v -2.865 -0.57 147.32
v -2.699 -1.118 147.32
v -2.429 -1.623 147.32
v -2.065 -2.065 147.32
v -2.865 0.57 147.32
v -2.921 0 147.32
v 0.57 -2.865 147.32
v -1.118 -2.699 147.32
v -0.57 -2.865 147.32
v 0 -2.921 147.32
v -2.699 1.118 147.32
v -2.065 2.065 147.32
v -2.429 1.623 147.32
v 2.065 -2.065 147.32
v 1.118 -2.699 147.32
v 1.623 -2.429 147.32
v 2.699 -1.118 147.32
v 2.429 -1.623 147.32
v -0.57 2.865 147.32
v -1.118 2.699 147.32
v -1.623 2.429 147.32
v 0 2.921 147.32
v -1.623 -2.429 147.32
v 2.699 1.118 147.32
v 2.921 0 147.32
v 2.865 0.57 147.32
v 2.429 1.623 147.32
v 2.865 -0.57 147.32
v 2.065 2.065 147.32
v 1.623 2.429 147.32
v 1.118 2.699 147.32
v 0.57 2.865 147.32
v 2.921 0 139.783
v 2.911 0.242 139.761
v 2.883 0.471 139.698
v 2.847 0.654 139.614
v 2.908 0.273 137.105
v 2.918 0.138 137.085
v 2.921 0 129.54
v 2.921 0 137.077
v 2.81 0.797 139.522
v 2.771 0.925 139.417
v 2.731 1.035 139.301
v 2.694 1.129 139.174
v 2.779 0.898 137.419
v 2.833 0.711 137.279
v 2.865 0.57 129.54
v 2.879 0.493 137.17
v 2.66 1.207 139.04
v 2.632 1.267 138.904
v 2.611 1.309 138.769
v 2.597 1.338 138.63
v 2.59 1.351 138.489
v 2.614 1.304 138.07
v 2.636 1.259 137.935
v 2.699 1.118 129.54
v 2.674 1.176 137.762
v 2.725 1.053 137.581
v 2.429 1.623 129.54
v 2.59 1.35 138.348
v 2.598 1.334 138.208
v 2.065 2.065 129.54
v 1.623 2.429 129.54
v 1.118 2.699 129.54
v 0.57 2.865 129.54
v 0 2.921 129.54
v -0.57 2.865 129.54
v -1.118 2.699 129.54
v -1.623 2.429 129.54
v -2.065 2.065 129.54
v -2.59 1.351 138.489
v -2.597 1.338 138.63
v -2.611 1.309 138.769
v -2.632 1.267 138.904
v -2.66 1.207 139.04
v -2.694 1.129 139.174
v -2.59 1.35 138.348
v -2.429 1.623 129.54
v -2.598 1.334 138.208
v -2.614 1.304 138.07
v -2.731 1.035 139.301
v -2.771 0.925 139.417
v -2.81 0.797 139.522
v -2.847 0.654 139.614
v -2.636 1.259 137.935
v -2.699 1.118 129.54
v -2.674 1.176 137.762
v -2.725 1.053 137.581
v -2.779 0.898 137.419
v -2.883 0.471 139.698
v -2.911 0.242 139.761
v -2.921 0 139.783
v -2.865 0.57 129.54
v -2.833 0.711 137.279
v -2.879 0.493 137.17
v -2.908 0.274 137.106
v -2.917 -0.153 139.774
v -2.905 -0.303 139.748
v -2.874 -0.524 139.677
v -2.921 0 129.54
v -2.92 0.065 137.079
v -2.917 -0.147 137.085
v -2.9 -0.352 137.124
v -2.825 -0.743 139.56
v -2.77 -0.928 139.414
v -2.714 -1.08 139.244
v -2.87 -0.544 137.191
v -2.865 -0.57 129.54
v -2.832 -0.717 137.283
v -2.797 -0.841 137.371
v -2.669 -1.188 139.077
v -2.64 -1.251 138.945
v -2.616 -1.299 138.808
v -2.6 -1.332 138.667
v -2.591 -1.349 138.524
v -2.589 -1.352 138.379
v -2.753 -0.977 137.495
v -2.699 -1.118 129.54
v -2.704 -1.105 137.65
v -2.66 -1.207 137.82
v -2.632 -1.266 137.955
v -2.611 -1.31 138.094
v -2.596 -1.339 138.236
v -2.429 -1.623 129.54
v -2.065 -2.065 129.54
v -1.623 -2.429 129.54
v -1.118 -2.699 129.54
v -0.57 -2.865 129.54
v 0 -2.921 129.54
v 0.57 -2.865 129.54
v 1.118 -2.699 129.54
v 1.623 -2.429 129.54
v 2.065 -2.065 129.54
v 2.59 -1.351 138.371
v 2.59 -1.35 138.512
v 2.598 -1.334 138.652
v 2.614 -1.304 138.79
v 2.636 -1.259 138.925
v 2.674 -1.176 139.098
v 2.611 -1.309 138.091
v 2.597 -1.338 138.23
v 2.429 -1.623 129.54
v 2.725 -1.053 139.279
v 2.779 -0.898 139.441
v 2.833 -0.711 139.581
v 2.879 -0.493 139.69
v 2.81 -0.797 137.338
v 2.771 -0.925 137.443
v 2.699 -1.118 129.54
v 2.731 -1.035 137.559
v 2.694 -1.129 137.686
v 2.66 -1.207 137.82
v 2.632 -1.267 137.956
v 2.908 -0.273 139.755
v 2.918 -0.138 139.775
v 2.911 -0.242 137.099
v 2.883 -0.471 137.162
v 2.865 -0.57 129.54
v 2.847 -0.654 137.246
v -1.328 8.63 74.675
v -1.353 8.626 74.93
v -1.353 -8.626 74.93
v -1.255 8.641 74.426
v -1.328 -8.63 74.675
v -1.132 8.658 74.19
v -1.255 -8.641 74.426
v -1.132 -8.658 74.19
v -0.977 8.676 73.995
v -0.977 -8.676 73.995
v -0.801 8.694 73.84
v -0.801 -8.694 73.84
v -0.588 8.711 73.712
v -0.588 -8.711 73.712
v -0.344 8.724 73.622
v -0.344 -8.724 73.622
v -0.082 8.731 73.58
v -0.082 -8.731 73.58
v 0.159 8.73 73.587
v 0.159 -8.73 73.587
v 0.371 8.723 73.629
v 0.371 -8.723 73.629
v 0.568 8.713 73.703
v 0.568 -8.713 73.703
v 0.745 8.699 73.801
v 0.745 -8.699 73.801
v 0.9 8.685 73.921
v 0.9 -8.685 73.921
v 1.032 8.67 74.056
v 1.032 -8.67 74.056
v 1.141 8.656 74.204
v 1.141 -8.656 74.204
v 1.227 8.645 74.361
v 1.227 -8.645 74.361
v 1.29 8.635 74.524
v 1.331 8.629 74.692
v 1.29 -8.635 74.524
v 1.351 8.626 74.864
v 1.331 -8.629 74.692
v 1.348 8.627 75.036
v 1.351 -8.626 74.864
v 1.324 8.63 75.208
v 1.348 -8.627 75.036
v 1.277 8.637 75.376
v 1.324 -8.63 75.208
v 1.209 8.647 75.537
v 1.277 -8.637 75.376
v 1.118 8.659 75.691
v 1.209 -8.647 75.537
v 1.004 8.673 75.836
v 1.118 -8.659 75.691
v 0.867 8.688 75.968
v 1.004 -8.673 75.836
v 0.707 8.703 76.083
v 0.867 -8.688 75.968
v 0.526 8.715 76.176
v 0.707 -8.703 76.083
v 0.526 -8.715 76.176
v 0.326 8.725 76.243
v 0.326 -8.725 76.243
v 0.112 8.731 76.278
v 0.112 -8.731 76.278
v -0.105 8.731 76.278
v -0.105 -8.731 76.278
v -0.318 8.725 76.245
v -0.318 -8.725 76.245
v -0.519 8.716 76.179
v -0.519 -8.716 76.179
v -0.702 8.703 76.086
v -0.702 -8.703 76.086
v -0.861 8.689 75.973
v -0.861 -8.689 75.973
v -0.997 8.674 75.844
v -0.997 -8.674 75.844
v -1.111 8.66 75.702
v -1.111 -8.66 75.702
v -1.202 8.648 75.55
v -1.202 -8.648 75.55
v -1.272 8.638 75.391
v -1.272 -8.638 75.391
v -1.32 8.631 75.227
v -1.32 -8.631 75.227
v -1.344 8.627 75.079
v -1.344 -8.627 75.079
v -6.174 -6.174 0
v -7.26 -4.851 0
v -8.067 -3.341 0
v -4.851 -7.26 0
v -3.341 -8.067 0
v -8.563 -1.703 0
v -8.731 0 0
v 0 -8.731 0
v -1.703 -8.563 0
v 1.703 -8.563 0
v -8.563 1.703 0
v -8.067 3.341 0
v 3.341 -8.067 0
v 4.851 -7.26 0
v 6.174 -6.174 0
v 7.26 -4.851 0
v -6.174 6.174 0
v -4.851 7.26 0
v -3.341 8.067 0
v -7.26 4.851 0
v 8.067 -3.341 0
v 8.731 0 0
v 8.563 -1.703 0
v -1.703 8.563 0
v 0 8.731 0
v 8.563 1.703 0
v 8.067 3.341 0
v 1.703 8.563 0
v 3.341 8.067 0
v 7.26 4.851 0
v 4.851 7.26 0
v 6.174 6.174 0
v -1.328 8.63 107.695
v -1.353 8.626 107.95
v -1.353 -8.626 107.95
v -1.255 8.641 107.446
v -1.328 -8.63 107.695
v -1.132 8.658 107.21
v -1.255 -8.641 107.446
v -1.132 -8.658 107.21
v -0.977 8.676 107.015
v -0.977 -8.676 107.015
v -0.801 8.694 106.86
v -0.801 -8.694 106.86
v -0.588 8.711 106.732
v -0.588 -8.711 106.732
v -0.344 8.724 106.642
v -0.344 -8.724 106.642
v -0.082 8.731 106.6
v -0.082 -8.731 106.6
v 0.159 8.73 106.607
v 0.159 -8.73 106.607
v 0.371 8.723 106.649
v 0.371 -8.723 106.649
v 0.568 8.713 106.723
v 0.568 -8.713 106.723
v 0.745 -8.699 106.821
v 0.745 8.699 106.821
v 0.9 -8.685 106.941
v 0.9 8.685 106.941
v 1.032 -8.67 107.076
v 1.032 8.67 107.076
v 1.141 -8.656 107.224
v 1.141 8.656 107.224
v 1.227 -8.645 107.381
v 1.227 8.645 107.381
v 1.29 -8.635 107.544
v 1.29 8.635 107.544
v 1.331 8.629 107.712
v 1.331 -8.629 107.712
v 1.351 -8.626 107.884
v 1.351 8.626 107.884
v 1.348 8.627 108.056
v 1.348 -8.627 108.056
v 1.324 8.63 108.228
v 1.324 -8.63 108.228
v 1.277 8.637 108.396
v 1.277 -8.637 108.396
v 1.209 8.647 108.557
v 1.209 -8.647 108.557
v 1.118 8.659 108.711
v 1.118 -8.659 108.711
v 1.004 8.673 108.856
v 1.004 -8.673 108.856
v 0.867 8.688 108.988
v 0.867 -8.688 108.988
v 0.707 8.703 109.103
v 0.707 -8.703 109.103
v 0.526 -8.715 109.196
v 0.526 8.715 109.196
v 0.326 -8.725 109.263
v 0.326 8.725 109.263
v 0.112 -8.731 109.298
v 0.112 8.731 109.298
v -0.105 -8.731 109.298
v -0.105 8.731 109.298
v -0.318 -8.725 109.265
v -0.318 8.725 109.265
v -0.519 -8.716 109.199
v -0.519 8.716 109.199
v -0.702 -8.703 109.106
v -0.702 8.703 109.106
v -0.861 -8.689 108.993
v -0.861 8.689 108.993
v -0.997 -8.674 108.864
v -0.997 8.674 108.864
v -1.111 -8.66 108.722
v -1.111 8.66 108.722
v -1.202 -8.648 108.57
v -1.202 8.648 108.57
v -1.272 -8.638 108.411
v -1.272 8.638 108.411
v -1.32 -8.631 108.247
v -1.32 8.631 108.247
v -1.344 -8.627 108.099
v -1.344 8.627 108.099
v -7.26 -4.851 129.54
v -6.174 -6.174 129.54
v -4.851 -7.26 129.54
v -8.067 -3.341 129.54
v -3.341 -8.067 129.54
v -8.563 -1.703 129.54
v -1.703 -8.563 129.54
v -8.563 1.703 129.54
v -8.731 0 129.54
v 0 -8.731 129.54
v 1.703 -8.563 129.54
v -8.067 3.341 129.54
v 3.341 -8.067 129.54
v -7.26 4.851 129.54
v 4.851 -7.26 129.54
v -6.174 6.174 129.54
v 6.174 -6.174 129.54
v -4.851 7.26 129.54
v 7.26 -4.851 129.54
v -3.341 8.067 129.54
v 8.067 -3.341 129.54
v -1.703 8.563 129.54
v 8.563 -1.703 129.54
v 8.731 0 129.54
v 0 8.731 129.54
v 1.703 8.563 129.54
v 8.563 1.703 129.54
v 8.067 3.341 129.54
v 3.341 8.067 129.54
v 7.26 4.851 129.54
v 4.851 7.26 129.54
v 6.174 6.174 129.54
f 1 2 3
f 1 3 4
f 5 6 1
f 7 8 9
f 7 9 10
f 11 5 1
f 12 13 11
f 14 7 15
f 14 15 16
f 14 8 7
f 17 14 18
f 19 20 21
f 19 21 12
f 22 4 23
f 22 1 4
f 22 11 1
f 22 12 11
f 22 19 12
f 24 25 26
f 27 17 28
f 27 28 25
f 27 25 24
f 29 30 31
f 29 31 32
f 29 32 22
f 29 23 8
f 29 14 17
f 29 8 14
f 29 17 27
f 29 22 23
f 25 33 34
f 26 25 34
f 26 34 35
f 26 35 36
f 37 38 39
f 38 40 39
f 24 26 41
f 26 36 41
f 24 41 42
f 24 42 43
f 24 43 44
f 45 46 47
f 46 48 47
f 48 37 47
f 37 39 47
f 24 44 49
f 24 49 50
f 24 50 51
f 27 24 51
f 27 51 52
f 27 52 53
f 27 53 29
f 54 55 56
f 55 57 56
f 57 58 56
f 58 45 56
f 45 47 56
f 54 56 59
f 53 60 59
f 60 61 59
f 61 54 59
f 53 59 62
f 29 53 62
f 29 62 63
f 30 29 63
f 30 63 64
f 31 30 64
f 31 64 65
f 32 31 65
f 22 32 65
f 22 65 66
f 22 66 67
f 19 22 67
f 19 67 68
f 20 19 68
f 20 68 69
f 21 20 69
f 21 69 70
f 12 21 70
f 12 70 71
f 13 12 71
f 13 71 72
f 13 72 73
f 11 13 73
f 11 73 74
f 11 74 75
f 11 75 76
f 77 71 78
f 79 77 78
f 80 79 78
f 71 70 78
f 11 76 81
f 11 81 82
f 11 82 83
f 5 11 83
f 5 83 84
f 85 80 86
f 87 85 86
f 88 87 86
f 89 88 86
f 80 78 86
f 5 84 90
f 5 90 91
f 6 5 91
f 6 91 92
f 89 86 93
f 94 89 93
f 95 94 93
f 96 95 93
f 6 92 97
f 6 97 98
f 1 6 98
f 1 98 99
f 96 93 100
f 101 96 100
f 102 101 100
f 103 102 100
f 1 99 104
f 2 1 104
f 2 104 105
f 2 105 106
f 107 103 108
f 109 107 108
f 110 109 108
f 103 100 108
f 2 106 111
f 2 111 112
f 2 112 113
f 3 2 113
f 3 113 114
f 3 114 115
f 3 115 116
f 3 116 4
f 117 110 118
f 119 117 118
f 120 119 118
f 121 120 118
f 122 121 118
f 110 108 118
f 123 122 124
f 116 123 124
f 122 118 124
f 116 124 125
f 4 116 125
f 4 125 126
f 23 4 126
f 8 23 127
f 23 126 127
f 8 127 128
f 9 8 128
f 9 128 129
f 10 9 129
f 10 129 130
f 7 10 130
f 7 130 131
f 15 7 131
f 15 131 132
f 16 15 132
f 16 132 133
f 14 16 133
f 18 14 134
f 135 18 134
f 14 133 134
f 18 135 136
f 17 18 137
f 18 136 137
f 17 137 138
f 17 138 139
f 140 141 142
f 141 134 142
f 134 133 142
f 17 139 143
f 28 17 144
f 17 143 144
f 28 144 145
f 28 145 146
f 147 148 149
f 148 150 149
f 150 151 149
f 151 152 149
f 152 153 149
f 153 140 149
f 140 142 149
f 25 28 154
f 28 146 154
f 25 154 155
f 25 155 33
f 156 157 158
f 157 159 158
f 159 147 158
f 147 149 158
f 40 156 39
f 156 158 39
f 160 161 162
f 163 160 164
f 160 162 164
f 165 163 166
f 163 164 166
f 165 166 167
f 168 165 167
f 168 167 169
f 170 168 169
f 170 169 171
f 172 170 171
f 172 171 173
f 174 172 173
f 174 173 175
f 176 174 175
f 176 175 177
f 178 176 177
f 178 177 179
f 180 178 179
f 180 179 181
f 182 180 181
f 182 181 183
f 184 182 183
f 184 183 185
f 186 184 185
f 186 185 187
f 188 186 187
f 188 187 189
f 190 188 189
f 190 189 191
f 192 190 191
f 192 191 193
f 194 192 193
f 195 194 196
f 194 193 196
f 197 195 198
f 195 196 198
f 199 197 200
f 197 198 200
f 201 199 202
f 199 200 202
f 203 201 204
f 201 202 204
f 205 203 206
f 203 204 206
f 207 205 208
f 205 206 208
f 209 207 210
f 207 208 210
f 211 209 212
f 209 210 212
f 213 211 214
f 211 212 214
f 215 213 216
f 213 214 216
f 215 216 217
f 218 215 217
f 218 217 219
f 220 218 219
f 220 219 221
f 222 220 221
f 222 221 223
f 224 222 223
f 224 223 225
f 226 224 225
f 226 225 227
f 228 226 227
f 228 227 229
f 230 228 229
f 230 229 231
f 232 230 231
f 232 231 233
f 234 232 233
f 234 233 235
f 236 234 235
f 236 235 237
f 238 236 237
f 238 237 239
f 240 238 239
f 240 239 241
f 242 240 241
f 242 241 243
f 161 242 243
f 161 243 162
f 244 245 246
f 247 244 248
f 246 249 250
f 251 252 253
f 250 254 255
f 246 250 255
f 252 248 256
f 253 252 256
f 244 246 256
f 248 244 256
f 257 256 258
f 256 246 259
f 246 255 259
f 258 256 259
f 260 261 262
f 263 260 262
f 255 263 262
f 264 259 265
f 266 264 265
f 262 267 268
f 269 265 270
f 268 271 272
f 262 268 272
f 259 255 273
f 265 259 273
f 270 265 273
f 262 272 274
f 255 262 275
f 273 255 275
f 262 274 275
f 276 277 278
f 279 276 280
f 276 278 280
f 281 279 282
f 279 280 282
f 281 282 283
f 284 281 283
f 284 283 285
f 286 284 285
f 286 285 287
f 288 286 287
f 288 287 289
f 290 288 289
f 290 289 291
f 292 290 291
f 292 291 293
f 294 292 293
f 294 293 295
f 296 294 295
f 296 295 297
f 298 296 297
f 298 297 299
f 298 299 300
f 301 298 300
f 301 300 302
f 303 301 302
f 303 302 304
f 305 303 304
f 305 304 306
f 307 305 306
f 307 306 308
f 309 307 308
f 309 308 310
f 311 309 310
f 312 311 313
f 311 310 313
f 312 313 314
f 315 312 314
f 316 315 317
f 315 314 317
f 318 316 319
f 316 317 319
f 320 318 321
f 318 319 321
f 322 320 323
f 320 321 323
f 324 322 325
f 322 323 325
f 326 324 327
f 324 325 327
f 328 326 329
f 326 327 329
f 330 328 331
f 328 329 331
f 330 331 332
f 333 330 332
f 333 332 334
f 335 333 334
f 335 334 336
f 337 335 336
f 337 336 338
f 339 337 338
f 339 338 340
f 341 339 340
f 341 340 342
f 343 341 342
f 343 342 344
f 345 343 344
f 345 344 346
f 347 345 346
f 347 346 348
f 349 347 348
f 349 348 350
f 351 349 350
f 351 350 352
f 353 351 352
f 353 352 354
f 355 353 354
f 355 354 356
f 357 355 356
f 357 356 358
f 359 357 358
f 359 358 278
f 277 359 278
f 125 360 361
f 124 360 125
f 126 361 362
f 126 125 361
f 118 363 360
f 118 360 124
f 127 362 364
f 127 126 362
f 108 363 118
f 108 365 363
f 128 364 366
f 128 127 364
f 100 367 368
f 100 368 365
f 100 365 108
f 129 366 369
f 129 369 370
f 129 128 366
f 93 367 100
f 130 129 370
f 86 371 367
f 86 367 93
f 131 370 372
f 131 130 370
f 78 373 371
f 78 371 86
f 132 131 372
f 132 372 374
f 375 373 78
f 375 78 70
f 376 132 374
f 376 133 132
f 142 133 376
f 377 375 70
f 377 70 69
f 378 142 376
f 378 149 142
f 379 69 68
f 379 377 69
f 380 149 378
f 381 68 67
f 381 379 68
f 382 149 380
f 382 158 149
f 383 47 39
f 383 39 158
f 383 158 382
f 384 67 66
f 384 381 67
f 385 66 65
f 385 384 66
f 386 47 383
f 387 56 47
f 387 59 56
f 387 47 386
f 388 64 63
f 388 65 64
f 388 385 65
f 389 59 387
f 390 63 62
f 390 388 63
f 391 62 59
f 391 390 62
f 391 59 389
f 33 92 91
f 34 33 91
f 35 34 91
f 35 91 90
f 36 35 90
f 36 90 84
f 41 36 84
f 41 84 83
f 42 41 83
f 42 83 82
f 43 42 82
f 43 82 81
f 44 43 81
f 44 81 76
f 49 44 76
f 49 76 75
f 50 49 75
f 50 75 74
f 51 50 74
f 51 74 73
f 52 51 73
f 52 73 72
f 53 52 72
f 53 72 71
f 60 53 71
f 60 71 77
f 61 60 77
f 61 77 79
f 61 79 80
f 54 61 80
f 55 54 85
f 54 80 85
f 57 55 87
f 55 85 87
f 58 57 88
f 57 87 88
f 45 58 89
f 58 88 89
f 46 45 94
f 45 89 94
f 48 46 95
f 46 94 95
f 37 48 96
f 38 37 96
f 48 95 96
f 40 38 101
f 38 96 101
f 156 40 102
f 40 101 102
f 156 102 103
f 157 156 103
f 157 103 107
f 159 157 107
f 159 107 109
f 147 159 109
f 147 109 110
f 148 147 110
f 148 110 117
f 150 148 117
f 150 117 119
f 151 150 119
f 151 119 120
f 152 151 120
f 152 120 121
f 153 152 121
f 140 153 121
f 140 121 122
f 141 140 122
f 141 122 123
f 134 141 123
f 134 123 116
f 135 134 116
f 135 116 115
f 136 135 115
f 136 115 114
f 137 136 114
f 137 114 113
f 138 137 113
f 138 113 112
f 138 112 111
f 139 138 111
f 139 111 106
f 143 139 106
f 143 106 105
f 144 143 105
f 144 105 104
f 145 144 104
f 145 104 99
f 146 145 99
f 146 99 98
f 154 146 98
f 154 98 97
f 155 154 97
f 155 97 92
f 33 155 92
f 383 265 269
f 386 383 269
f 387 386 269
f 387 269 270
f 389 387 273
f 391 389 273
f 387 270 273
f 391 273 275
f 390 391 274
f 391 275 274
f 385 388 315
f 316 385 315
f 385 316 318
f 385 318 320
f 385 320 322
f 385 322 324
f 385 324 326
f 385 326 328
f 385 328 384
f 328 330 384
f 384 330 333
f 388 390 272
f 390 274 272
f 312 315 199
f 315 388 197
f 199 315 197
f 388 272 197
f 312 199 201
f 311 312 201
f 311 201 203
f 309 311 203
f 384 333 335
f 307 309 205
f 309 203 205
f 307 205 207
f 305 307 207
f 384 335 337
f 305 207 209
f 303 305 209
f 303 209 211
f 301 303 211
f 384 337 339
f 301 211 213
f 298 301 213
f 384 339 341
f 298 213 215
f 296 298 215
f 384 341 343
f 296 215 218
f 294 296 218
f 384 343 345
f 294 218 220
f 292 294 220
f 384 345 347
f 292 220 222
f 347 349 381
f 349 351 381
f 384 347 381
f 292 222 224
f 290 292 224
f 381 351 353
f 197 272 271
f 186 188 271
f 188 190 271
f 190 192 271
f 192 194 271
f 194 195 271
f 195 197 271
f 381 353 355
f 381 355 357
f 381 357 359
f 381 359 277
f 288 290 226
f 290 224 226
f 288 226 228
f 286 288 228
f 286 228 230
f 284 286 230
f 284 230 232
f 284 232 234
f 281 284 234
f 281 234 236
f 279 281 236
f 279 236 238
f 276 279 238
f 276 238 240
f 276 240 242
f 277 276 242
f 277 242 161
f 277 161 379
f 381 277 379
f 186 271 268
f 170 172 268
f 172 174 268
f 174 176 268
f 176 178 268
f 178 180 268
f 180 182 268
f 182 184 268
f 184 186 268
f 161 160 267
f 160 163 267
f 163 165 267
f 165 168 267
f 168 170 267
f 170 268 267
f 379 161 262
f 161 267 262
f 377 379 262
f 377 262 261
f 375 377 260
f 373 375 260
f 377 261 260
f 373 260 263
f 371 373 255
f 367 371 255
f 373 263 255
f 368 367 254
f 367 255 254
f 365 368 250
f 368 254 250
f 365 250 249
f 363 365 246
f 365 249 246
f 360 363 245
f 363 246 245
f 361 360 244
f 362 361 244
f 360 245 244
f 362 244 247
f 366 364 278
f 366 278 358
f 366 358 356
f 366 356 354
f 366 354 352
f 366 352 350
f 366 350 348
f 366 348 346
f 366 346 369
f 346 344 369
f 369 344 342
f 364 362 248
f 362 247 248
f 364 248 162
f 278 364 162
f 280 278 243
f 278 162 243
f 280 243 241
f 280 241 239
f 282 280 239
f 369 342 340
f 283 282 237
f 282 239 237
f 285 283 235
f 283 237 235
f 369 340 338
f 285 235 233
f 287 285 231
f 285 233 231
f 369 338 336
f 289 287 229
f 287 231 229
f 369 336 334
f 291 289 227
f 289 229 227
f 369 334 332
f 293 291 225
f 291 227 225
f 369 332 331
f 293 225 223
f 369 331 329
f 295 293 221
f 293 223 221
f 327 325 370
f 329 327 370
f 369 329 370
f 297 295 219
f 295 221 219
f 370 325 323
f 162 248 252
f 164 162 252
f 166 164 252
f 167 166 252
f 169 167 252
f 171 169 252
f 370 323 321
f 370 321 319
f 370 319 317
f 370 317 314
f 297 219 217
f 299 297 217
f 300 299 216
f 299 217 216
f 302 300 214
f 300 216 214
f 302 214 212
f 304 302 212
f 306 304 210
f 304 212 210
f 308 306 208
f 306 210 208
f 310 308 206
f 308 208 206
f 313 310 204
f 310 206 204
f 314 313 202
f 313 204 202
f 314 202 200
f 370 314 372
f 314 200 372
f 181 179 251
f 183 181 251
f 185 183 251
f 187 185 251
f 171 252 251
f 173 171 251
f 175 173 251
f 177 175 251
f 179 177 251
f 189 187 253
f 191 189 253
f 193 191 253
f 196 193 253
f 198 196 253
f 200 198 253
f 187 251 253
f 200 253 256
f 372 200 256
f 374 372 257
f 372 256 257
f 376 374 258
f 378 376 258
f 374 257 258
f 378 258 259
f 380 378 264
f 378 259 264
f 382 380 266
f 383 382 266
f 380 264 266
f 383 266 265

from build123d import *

# Parameters (mm, degrees)
SKETCH1_R             = 8.73125
BOSS_EXTRUDE1_DEPTH   = 129.54
SKETCH2_R             = 2.921
BOSS_EXTRUDE2_DEPTH   = 17.78
F_6_32_TAPPED_HOLE1_D = 2.7051
F_6_32_TAPPED_HOLE2_D = 2.7051


with BuildPart() as part:
    # Sketch1 → Boss-Extrude1 (new body)
    with BuildSketch(Plane.XY):
        Circle(SKETCH1_R)
    extrude(amount=BOSS_EXTRUDE1_DEPTH)

    # Sketch2 → Boss-Extrude2 (add)
    with BuildSketch(Plane.XY.offset(129.54)):
        Circle(SKETCH2_R)
    extrude(amount=BOSS_EXTRUDE2_DEPTH)

    # #6-32 Tapped Hole1 (through all)
    with Locations(Plane(origin=(0, 8.73125, 0), x_dir=(1, 0, 0), z_dir=(0, 1, 0))):
        with Locations((0, -74.93), (0, -107.95)):
            Hole(F_6_32_TAPPED_HOLE1_D / 2)

    # #6-32 Tapped Hole2 (through all)
    with Locations(Plane(origin=(2.921, 0, 0), x_dir=(0, 0, -1), z_dir=(1, 0, 0))):
        with Locations((-138.43, 0)):
            Hole(F_6_32_TAPPED_HOLE2_D / 2)


solid = part.part
